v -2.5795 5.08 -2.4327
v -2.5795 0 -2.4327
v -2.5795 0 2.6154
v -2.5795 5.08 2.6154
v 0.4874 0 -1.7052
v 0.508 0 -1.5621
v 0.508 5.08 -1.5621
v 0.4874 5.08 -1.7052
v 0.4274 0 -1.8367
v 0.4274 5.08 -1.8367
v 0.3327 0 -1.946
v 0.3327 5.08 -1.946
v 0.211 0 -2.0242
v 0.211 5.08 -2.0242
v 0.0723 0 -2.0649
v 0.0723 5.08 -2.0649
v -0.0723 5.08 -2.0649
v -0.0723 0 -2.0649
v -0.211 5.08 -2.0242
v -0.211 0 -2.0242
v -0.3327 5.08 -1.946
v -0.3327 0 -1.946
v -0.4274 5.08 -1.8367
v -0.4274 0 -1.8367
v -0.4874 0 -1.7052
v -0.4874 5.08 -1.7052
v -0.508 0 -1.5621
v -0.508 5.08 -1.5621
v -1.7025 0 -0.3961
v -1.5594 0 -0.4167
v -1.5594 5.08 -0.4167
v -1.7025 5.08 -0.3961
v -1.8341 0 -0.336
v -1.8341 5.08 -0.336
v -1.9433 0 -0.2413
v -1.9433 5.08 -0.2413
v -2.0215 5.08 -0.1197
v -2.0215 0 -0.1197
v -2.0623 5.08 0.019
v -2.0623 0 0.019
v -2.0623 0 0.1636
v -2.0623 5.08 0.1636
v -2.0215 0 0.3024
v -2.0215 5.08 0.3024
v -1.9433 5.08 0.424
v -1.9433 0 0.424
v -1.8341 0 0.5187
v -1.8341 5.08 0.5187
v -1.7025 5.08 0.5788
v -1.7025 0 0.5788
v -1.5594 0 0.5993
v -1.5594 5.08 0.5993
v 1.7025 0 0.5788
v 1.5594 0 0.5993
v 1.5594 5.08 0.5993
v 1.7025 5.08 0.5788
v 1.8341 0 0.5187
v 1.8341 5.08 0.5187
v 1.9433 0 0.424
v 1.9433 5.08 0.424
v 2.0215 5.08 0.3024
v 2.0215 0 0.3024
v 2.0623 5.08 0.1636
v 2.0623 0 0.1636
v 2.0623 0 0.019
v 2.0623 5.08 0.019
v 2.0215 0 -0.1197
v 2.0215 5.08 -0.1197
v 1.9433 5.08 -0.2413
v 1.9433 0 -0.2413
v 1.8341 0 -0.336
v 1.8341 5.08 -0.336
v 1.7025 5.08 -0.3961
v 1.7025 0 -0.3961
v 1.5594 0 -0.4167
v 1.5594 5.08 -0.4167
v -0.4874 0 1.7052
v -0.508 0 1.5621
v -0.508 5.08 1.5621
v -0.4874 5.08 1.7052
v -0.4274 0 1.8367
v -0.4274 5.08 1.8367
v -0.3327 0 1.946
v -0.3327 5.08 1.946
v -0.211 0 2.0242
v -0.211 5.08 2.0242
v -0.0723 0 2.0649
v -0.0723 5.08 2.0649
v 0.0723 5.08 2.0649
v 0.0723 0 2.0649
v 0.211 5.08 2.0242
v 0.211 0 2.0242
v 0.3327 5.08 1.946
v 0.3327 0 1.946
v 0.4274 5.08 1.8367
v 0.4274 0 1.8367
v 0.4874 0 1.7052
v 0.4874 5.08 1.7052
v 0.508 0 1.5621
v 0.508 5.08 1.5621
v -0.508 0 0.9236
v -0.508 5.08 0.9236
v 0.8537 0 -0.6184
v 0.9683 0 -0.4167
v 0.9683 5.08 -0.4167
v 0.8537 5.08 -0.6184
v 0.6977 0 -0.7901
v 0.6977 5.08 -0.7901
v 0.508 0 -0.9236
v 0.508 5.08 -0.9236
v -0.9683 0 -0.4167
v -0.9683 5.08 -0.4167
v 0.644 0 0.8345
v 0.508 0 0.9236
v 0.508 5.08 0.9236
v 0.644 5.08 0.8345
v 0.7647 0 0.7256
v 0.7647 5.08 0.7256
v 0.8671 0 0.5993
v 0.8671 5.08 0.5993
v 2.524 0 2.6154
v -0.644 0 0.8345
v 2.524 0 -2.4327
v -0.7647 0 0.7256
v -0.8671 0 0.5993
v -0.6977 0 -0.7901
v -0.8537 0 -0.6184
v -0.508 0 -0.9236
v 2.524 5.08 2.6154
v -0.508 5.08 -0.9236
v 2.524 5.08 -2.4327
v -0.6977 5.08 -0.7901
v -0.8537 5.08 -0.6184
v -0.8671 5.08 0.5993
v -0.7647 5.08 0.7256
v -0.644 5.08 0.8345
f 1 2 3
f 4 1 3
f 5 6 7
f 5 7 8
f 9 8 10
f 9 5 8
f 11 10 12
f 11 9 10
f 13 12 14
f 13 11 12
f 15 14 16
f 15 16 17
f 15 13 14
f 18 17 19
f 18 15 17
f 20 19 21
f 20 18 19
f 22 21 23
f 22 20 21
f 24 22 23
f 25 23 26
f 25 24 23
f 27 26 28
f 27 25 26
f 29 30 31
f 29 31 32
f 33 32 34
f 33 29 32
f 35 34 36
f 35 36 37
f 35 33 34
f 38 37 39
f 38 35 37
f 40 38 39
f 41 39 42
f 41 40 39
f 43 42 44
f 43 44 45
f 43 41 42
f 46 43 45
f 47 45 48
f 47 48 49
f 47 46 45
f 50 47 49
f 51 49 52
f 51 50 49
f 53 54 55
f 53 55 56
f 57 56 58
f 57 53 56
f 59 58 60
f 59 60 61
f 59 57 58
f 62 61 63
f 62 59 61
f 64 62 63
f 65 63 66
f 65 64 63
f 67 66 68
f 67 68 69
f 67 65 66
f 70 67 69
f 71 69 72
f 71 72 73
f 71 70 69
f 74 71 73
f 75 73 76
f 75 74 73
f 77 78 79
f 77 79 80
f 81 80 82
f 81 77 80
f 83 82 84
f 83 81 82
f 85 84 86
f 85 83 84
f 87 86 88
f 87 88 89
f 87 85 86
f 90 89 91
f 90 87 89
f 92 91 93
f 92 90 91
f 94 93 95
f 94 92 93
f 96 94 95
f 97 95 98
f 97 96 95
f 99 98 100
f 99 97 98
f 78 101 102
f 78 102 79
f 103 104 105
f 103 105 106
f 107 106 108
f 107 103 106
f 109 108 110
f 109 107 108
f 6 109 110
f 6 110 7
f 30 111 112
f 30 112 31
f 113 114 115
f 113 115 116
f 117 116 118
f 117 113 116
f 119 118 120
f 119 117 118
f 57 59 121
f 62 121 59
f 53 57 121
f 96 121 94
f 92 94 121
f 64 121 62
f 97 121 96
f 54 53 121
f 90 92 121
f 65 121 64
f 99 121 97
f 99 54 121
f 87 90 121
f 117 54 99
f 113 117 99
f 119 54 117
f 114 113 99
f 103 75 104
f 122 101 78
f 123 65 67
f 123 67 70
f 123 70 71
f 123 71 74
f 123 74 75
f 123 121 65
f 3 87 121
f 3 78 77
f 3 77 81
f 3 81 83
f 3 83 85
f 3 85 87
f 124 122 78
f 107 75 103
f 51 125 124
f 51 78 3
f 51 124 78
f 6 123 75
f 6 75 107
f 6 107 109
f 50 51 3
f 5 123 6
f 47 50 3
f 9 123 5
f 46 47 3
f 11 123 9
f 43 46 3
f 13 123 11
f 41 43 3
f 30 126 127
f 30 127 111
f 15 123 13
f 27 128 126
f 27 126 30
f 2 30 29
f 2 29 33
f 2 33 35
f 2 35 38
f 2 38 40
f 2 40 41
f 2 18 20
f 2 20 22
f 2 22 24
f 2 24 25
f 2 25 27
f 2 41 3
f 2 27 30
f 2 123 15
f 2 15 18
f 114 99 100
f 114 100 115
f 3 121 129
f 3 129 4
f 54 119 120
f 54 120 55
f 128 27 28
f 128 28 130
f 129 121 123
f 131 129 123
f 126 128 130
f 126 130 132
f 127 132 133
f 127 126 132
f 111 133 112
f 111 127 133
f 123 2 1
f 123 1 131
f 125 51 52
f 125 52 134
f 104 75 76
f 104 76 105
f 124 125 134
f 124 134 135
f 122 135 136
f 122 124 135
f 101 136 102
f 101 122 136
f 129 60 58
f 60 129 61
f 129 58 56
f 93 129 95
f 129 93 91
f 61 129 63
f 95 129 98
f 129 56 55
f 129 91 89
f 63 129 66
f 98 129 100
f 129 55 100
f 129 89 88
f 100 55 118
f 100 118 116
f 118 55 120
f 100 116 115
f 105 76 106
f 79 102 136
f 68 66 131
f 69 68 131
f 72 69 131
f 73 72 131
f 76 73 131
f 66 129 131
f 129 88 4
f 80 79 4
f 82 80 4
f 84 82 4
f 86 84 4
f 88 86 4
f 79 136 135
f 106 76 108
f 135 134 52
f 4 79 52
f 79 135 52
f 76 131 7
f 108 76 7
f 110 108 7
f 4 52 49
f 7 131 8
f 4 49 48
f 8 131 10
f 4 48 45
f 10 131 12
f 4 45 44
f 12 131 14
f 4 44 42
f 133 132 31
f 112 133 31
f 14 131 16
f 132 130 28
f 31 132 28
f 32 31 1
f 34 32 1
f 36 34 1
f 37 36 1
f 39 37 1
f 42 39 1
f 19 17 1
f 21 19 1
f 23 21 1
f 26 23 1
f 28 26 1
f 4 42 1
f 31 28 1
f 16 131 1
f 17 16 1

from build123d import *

# Parameters (mm, degrees)
BOSS_EXTRUDE1_DEPTH = 5.08


with BuildPart() as part:
    # Sketch1 → Boss-Extrude1 (new body)
    with BuildSketch(Plane(origin=(0, 0, 0), x_dir=(1, 0, 0), z_dir=(0, 1, 0))):
        Polygon((-2.579450384, -0.091335292), (-2.579450384, 2.43268731), (2.524046381, 2.43268731), (2.524046381, -0.091335292), (2.524046381, -2.615357894), (-2.579450384, -2.615357894), align=None)
        with BuildLine():
            Line((-1.559427547, -0.599335292), (-0.867135524, -0.599335292))
            ThreePointArc((-0.867135524, -0.599335292), (-0.706426639, -0.782360667), (-0.508, -0.923613994))
            Line((-0.508, -0.923613994), (-0.508, -1.5621))
            ThreePointArc((-0.508, -1.5621), (0, -2.0701), (0.508, -1.5621))
            Line((0.508, -1.5621), (0.508, -0.923613994))
            ThreePointArc((0.508, -0.923613994), (0.706426639, -0.782360667), (0.867135524, -0.599335292))
            Line((0.867135524, -0.599335292), (1.559427547, -0.599335292))
            ThreePointArc((1.559427547, -0.599335292), (2.067427547, -0.091335292), (1.559427547, 0.416664708))
            Line((1.559427547, 0.416664708), (0.968254786, 0.416664708))
            ThreePointArc((0.968254786, 0.416664708), (0.7804367, 0.708551598), (0.508, 0.923613994))
            Line((0.508, 0.923613994), (0.508, 1.5621))
            ThreePointArc((0.508, 1.5621), (0, 2.0701), (-0.508, 1.5621))
            Line((-0.508, 1.5621), (-0.508, 0.923613994))
            ThreePointArc((-0.508, 0.923613994), (-0.7804367, 0.708551598), (-0.968254786, 0.416664708))
            Line((-0.968254786, 0.416664708), (-1.559427547, 0.416664708))
            ThreePointArc((-1.559427547, 0.416664708), (-2.067427547, -0.091335292), (-1.559427547, -0.599335292))
        make_face(mode=Mode.SUBTRACT)
    extrude(amount=BOSS_EXTRUDE1_DEPTH)


solid = part.part
